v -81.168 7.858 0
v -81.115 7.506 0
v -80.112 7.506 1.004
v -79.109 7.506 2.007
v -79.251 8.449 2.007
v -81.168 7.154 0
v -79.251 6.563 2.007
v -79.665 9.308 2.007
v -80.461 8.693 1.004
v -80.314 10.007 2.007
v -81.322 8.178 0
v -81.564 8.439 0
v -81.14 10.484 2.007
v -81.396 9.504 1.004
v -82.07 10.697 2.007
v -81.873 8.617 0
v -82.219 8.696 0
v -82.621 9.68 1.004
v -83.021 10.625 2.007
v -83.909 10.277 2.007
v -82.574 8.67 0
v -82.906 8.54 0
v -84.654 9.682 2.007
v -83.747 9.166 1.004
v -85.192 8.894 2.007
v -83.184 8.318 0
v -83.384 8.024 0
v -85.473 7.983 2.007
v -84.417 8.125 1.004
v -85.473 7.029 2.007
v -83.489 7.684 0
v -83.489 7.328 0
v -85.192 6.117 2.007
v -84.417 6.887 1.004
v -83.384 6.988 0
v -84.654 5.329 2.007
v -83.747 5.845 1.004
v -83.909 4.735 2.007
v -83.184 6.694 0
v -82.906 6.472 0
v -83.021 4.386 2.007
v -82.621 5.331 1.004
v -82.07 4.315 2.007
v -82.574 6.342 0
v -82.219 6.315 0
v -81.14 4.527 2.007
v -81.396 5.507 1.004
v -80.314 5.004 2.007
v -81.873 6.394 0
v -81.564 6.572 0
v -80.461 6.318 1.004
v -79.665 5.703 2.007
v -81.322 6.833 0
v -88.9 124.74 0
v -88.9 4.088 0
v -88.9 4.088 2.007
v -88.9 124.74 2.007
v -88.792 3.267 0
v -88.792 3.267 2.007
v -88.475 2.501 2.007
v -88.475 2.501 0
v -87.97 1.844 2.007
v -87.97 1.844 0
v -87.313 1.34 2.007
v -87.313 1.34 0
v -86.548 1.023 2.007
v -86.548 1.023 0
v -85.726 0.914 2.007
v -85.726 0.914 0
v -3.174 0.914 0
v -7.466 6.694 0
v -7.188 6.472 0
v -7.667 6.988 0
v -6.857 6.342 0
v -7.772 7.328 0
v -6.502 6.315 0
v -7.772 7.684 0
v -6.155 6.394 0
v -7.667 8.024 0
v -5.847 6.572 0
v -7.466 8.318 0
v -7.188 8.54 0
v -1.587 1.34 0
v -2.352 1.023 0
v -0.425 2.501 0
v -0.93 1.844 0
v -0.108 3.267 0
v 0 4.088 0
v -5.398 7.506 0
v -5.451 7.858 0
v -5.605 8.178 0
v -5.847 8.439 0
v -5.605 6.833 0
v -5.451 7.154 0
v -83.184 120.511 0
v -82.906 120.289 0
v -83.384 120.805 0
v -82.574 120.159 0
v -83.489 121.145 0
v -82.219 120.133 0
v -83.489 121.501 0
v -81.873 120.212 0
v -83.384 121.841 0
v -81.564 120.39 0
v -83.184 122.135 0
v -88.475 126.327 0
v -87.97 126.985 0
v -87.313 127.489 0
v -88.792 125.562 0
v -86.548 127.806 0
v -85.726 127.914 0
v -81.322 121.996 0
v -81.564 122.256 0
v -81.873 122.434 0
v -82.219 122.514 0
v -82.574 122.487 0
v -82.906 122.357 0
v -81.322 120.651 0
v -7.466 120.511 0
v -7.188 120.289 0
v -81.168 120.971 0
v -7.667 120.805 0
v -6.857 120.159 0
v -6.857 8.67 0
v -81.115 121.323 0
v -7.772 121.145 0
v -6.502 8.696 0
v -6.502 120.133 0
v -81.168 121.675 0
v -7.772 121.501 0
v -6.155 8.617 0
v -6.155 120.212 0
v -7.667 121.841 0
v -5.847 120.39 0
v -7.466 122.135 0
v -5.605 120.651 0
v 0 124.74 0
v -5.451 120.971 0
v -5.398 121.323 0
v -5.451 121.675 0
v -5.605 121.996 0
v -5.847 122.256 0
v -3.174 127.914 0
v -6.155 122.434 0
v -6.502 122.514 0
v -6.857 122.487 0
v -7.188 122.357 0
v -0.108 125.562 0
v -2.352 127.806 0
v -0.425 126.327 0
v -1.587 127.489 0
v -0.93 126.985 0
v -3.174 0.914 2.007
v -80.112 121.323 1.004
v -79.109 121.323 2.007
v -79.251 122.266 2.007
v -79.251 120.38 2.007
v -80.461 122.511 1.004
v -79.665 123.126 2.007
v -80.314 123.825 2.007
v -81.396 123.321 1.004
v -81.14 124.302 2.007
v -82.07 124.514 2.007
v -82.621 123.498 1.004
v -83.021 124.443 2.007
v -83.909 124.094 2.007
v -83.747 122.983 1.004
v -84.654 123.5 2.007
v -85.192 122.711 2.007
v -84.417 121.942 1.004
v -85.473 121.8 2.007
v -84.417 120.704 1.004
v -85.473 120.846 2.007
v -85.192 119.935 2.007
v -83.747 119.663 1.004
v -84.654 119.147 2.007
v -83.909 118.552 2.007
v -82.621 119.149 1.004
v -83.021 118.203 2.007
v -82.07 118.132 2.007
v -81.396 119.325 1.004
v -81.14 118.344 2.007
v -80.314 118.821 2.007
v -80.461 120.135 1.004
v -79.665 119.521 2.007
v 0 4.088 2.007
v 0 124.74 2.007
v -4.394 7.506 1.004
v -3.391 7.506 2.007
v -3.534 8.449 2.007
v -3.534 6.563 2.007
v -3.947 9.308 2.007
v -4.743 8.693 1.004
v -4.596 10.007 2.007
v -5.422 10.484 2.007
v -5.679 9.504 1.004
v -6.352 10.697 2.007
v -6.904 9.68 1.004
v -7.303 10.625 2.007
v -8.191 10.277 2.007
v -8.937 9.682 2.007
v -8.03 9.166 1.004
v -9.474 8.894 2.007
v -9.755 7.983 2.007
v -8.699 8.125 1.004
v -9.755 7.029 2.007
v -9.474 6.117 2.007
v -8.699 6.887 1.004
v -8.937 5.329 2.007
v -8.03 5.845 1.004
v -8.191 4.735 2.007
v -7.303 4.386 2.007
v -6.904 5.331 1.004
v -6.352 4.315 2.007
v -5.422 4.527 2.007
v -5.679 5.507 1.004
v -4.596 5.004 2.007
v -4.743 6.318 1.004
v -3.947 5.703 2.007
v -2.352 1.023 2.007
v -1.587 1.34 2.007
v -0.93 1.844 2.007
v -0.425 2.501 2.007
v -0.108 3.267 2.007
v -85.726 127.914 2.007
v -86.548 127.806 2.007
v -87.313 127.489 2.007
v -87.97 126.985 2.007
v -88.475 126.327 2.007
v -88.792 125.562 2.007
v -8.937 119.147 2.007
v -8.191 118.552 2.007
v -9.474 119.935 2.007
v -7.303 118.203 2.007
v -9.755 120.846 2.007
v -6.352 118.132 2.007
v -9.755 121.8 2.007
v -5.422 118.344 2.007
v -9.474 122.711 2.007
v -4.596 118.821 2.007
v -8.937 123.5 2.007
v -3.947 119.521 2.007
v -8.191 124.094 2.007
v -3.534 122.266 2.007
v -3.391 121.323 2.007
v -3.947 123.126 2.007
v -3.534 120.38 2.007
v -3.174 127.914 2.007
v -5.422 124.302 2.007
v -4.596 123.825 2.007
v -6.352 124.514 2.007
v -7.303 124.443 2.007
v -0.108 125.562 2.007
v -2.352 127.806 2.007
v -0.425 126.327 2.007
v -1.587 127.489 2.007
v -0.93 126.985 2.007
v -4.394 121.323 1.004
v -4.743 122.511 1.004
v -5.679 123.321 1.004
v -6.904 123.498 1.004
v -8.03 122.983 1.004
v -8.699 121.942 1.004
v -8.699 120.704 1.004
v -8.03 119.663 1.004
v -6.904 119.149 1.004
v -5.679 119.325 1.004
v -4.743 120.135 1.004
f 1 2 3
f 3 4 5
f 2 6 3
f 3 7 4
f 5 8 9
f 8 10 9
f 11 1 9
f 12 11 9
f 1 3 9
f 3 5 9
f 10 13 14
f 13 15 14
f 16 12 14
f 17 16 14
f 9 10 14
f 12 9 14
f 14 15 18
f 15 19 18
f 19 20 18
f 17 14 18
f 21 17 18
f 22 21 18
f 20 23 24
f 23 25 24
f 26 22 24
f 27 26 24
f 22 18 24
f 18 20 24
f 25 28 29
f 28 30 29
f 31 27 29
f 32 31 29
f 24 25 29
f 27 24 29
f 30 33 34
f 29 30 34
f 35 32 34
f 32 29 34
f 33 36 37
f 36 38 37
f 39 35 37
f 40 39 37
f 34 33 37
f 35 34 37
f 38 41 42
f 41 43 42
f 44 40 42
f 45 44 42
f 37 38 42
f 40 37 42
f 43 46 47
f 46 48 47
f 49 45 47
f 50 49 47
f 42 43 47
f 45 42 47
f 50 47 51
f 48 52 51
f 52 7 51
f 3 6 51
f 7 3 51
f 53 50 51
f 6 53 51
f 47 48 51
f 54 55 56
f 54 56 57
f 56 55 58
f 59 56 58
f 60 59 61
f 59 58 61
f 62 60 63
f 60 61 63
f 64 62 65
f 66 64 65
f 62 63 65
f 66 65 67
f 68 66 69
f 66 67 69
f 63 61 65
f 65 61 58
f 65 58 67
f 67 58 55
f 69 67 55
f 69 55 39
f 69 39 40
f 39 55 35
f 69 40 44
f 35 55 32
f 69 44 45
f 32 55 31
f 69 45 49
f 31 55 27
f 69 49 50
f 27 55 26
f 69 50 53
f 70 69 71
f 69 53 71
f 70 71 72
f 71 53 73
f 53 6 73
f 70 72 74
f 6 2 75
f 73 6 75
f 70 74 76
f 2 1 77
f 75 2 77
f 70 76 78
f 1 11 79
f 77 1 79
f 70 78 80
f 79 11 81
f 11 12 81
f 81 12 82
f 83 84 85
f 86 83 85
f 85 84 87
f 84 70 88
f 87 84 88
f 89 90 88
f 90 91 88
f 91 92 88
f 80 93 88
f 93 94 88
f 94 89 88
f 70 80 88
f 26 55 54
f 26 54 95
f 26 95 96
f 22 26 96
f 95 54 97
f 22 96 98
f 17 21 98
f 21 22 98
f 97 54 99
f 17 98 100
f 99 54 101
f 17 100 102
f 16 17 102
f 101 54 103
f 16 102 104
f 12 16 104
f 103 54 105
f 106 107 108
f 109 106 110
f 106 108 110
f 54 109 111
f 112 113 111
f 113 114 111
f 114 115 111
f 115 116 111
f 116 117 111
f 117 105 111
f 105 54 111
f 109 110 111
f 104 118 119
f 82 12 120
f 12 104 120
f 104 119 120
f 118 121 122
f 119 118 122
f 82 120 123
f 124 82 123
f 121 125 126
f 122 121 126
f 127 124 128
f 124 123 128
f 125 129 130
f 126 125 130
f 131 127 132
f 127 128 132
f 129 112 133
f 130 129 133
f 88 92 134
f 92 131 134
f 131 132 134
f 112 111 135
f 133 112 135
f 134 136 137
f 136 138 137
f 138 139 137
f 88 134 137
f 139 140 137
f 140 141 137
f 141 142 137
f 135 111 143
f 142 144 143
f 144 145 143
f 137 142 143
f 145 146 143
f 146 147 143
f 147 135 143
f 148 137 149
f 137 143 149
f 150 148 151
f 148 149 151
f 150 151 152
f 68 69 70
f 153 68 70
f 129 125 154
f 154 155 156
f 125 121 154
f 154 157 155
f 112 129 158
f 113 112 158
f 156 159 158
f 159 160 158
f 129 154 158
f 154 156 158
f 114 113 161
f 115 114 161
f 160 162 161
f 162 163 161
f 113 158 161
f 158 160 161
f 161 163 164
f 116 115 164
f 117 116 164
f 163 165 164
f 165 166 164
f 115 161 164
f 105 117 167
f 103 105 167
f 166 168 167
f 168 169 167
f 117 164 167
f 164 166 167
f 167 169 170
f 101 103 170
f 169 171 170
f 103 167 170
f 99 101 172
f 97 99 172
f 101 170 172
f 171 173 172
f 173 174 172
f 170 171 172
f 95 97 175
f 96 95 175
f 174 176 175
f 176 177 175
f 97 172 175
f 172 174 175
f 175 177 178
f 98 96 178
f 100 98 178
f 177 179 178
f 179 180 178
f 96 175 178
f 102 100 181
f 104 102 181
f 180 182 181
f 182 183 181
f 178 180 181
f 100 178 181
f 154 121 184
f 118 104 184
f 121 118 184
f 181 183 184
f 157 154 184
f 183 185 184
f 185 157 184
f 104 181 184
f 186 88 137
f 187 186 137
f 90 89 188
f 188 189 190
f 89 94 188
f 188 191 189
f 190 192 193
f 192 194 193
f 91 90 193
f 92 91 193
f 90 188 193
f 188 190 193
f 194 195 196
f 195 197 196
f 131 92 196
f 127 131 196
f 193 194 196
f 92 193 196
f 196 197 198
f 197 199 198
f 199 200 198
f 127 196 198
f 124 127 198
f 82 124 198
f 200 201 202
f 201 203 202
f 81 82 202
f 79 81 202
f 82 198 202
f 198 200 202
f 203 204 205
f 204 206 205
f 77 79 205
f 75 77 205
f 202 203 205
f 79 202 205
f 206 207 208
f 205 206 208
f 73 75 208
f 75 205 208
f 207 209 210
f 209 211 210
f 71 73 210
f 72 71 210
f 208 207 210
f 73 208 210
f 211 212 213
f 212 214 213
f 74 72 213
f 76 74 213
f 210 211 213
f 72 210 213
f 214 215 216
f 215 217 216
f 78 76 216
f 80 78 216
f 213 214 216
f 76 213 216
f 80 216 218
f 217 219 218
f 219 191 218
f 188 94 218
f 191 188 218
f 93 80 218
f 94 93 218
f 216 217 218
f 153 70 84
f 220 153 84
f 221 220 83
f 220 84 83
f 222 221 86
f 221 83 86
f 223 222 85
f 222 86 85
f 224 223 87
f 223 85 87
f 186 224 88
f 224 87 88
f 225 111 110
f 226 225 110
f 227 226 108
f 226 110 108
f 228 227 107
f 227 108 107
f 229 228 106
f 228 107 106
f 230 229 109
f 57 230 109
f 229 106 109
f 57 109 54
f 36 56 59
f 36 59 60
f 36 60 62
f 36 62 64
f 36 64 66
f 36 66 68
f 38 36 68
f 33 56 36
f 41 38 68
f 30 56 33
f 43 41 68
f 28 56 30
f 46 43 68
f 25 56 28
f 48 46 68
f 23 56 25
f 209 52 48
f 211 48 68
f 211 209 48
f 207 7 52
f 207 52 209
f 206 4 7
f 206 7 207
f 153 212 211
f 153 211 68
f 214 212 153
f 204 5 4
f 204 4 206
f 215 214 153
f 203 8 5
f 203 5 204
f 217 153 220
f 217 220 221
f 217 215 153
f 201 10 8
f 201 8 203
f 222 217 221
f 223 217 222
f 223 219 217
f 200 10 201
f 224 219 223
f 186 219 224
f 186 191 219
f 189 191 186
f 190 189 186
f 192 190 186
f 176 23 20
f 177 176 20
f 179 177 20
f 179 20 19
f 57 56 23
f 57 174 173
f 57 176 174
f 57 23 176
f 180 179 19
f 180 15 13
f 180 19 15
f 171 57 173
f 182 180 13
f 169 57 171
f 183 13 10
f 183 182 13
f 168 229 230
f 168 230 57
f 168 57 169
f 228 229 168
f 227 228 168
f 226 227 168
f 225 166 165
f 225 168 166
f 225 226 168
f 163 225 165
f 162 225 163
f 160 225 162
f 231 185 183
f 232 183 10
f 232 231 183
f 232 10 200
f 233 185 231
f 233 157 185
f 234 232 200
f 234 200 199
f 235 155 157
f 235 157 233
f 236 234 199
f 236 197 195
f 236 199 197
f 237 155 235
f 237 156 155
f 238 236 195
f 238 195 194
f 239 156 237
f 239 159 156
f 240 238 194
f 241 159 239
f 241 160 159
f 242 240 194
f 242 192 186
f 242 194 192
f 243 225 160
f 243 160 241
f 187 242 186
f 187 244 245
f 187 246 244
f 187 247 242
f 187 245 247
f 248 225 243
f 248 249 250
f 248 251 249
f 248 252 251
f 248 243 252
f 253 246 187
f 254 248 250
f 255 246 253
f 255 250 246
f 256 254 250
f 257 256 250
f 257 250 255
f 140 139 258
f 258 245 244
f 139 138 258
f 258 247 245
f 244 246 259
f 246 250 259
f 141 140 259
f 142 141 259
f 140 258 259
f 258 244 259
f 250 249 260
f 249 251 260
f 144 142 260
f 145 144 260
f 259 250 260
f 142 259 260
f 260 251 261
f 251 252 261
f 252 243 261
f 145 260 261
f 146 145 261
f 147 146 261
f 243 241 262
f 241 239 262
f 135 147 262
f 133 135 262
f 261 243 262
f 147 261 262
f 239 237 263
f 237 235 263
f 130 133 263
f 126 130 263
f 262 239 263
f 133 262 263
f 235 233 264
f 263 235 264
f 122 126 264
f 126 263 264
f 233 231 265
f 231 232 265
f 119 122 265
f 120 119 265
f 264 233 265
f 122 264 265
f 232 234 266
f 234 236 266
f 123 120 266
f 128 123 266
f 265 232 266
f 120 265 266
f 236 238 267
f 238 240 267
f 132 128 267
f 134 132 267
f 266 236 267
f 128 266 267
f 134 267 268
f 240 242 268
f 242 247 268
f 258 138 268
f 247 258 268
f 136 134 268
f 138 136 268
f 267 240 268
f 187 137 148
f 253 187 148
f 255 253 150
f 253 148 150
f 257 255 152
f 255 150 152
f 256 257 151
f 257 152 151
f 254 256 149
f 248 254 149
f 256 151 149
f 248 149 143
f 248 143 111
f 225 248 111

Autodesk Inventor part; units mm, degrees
ref_plane "YZ Plane" through (0, 0, 0) normal (1, 0, 0) x (0, 1, 0)
ref_plane "XZ Plane" through (0, 0, 0) normal (0, 1, 0) x (-1, 0, 0)
ref_plane "XY Plane" through (0, 0, 0) normal (0, 0, 1) x (1, 0, 0)
sketch "Sketch1" plane through (0, 0, 0) normal (0, 0, 1) x (1, 0, 0)
  line L0 (0, 4.0885) -> (0, 124.7403) projected
  ellipse E0 centre (-3.1759, 124.7385) end of major axis (-0.9296, 126.9848) minor radius 3.175 (0, 124.7403) -> (-3.1741, 127.9144) ccw projected
  line L1 (-3.1741, 127.9144) -> (-35.4736, 127.9144) projected
  line L2 (-53.4736, 127.9144) -> (-85.7259, 127.9144) projected
  ellipse E1 centre (-85.7241, 124.7385) end of major axis (-87.9704, 126.9848) minor radius 3.175 (-85.7259, 127.9144) -> (-88.9, 124.7403) ccw projected
  line L3 (-88.9, 4.0885) -> (-88.9, 124.7403) projected
  ellipse E2 centre (-85.7241, 4.0903) end of major axis (-87.9704, 1.844) minor radius 3.175 (-88.9, 4.0885) -> (-85.7259, 0.9144) ccw projected
  line L4 (-85.7259, 0.9144) -> (-61.8967, 0.9144) projected
  line L5 (-30.7967, 0.9144) -> (-3.1741, 0.9144) projected
  ellipse E3 centre (-3.1759, 4.0903) end of major axis (-0.9296, 1.844) minor radius 3.175 (-3.1741, 0.9144) -> (0, 4.0885) ccw projected
  circle A0 centre (-6.5913, 7.5057) radius 1.1938 projected
  circle A1 centre (-13.8176, 14.732) radius 1.1938 projected
  circle A2 centre (-82.3087, 7.5057) radius 1.1938 projected
  circle A3 centre (-75.0824, 14.732) radius 1.1938 projected
  circle A4 centre (-82.3087, 121.3231) radius 1.1938 projected
  circle A5 centre (-75.0824, 114.0968) radius 1.1938 projected
  circle A6 centre (-6.5913, 121.3231) radius 1.1938 projected
  circle A7 centre (-13.8176, 114.0968) radius 1.1938 projected
  line L6 (-53.4736, 127.9144) -> (-35.4736, 127.9144)
  line L7 (-61.8967, 0.9144) -> (-30.7967, 0.9144)
  point P0 (0, 0)
extrude "Extrusion1" add sketch "Sketch1" along normal blind 2.0066 contours E3 L5 L7 L4 E2 L3 E1 L2 L6 L1 E0 L0 | A1 | A3 | A5 | A7
chamfer "Chamfer1" distance 2.0066 distance2 2.0066 1 edges at (-7.7851, 121.3231, 2.0066) measured on face at (-48.7223, 43.2477, 2.0066)
chamfer "Chamfer2" distance 2.0066 distance2 2.0066 1 edges at (-83.5025, 121.3231, 2.0066) measured on face at (-48.7223, 43.2477, 2.0066)
chamfer "Chamfer3" distance 2.0066 distance2 2.0066 1 edges at (-83.5025, 7.5057, 2.0066) measured on face at (-48.7223, 43.2477, 2.0066)
chamfer "Chamfer4" distance 2.0066 distance2 2.0066 1 edges at (-7.7851, 7.5057, 2.0066) measured on face at (-54.9204, 46.3227, 2.0066)
properties part number "lid"
